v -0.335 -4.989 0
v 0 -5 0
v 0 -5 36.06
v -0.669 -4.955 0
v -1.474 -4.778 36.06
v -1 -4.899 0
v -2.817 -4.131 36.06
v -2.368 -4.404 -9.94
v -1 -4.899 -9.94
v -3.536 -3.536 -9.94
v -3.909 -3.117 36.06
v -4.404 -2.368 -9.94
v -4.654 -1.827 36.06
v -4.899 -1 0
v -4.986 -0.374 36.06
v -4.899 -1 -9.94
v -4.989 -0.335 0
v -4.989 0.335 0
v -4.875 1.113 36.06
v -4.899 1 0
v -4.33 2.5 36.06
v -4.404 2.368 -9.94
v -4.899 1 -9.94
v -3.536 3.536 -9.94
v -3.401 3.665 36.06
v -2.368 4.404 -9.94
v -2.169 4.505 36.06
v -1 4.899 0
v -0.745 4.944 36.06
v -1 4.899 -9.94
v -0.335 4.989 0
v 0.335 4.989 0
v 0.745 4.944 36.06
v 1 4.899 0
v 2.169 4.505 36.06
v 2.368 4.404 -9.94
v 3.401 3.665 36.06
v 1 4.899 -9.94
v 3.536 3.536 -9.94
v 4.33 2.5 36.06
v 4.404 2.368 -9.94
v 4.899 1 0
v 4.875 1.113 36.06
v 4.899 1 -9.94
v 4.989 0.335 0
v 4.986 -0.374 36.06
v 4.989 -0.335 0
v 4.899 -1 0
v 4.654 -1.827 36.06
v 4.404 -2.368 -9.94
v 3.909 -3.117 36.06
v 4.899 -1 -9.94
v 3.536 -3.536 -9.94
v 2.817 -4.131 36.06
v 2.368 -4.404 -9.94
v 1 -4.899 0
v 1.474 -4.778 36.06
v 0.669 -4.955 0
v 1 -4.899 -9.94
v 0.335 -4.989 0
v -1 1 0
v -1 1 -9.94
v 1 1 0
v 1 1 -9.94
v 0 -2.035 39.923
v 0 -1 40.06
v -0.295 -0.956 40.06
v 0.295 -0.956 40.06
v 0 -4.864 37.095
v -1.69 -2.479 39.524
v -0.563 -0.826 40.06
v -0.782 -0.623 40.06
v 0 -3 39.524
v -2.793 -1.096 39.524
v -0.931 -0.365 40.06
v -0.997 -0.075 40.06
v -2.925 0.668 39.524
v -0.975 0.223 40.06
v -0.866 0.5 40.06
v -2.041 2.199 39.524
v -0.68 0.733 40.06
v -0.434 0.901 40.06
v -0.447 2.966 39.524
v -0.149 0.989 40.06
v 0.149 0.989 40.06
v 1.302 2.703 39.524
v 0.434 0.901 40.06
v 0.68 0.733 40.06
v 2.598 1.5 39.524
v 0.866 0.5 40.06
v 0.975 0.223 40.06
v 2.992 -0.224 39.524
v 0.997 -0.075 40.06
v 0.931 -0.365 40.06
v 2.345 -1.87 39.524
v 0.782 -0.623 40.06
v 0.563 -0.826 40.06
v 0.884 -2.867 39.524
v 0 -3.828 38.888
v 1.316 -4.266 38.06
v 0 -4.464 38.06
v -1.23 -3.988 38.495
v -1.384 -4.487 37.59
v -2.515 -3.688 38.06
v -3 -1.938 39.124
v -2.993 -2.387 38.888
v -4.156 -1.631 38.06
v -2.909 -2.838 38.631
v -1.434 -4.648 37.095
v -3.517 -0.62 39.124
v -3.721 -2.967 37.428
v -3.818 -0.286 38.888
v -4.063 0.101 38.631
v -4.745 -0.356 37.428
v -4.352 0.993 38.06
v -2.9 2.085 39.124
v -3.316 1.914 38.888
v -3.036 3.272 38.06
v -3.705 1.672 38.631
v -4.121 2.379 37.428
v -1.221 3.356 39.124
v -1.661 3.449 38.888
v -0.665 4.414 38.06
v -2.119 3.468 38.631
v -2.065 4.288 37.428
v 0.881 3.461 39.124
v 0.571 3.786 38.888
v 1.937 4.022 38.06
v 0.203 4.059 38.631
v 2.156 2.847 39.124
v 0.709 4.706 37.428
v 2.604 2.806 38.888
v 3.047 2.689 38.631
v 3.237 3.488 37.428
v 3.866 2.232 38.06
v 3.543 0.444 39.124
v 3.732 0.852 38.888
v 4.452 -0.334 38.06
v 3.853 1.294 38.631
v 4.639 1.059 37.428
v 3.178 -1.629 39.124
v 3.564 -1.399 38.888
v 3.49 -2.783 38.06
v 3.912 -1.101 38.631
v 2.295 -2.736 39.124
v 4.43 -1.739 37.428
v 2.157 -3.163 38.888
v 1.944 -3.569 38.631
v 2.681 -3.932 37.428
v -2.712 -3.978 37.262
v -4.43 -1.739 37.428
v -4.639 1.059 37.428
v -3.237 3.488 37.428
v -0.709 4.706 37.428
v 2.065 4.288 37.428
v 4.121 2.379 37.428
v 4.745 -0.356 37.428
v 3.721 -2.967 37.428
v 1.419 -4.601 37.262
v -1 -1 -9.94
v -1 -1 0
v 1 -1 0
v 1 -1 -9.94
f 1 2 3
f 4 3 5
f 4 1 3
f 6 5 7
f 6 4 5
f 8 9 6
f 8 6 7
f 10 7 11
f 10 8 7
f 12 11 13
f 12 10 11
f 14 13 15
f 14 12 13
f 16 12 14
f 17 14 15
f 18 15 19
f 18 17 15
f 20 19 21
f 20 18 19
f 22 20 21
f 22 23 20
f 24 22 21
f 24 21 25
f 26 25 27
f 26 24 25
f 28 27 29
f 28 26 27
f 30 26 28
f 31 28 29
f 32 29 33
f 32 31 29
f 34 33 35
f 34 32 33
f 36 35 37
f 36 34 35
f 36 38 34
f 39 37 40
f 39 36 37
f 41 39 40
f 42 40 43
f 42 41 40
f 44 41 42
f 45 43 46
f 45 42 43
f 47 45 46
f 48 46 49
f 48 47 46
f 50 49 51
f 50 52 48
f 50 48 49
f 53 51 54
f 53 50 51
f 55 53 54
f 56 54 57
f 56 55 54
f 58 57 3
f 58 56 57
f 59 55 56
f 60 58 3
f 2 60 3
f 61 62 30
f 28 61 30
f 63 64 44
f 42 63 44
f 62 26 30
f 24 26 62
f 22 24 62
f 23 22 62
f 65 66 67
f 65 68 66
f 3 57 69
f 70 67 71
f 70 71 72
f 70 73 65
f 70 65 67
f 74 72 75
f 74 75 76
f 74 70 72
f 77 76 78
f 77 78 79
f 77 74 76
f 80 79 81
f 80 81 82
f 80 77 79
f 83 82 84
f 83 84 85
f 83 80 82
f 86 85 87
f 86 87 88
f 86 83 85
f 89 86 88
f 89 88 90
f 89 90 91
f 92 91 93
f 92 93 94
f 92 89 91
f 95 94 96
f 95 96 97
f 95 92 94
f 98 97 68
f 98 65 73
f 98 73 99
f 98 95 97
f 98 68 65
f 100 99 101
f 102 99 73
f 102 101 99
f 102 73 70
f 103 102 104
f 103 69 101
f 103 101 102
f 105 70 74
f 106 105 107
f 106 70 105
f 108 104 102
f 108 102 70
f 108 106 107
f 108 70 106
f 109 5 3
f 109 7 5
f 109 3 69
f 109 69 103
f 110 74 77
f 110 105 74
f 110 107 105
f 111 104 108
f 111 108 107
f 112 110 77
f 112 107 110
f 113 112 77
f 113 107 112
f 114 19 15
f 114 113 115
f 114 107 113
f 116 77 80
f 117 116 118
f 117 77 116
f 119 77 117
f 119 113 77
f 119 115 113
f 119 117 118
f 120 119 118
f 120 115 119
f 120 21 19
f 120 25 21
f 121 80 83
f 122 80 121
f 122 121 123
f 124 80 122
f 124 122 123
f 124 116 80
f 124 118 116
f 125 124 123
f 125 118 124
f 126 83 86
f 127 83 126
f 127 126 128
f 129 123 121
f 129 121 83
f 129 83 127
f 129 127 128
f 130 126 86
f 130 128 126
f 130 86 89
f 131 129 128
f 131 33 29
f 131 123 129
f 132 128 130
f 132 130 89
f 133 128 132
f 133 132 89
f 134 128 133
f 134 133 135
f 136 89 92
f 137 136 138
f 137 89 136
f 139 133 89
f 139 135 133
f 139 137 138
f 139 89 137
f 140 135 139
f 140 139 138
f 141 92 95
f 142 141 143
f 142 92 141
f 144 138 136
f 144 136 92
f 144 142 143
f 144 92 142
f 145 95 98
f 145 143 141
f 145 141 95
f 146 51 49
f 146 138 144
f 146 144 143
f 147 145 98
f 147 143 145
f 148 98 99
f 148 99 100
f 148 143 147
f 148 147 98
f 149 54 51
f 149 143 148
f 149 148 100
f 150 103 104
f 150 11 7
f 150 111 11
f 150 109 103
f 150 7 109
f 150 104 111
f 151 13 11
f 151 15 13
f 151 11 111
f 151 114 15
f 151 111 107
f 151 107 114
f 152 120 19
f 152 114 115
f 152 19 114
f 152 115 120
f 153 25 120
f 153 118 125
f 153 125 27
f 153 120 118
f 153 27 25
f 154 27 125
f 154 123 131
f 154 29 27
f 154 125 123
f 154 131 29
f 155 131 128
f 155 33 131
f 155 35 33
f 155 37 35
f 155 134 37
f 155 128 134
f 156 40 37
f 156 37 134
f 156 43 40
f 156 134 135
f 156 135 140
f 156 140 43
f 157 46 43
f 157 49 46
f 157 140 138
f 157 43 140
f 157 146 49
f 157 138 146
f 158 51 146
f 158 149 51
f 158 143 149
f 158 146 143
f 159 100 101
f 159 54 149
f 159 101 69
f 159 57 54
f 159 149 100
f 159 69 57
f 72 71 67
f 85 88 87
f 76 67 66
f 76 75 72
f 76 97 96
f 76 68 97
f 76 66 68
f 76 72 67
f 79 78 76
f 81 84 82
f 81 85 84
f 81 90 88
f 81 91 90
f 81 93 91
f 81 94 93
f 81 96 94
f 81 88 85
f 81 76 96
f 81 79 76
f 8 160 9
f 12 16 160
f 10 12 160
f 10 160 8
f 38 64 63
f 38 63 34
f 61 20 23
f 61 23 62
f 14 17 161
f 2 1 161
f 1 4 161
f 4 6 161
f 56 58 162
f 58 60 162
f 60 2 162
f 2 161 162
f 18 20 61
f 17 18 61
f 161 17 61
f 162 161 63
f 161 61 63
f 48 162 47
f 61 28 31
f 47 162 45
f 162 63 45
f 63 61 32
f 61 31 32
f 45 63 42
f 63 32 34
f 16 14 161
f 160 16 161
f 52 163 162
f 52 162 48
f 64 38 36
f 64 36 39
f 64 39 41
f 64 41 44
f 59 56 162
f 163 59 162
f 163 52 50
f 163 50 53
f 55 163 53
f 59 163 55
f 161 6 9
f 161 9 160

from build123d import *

# Parameters (mm, degrees)
F2_W     = 10
F2_H     = 2
F3_DEPTH = 25
F4_W     = 2
F4_H     = 10
F5_DEPTH = 25


with BuildPart() as f1:
    # F0 (on Right) → F1 (revolve)
    with BuildSketch(Plane.YZ):
        with BuildLine():
            Line((0, -9.940476), (0, 40.059524))
            Line((0, 40.059524), (-1, 40.059524))
            ThreePointArc((-1, 40.059524), (-3.828427, 38.887951), (-5, 36.059524))
            Line((-5, 36.059524), (-5, -9.940476))
            Line((-5, -9.940476), (0, -9.940476))
        make_face()
    revolve(axis=Axis((0, 0, 15.059524), (0, 0, -1)))

    # F2 (on Top) → F3 (cut)
    with BuildSketch(Plane.XY):
        Rectangle(F2_W, F2_H)
    extrude(amount=-F3_DEPTH, mode=Mode.SUBTRACT)

    # F4 (on Top) → F5 (cut)
    with BuildSketch(Plane.XY):
        Rectangle(F4_W, F4_H)
    extrude(amount=-F5_DEPTH, mode=Mode.SUBTRACT)


solid = f1.part
